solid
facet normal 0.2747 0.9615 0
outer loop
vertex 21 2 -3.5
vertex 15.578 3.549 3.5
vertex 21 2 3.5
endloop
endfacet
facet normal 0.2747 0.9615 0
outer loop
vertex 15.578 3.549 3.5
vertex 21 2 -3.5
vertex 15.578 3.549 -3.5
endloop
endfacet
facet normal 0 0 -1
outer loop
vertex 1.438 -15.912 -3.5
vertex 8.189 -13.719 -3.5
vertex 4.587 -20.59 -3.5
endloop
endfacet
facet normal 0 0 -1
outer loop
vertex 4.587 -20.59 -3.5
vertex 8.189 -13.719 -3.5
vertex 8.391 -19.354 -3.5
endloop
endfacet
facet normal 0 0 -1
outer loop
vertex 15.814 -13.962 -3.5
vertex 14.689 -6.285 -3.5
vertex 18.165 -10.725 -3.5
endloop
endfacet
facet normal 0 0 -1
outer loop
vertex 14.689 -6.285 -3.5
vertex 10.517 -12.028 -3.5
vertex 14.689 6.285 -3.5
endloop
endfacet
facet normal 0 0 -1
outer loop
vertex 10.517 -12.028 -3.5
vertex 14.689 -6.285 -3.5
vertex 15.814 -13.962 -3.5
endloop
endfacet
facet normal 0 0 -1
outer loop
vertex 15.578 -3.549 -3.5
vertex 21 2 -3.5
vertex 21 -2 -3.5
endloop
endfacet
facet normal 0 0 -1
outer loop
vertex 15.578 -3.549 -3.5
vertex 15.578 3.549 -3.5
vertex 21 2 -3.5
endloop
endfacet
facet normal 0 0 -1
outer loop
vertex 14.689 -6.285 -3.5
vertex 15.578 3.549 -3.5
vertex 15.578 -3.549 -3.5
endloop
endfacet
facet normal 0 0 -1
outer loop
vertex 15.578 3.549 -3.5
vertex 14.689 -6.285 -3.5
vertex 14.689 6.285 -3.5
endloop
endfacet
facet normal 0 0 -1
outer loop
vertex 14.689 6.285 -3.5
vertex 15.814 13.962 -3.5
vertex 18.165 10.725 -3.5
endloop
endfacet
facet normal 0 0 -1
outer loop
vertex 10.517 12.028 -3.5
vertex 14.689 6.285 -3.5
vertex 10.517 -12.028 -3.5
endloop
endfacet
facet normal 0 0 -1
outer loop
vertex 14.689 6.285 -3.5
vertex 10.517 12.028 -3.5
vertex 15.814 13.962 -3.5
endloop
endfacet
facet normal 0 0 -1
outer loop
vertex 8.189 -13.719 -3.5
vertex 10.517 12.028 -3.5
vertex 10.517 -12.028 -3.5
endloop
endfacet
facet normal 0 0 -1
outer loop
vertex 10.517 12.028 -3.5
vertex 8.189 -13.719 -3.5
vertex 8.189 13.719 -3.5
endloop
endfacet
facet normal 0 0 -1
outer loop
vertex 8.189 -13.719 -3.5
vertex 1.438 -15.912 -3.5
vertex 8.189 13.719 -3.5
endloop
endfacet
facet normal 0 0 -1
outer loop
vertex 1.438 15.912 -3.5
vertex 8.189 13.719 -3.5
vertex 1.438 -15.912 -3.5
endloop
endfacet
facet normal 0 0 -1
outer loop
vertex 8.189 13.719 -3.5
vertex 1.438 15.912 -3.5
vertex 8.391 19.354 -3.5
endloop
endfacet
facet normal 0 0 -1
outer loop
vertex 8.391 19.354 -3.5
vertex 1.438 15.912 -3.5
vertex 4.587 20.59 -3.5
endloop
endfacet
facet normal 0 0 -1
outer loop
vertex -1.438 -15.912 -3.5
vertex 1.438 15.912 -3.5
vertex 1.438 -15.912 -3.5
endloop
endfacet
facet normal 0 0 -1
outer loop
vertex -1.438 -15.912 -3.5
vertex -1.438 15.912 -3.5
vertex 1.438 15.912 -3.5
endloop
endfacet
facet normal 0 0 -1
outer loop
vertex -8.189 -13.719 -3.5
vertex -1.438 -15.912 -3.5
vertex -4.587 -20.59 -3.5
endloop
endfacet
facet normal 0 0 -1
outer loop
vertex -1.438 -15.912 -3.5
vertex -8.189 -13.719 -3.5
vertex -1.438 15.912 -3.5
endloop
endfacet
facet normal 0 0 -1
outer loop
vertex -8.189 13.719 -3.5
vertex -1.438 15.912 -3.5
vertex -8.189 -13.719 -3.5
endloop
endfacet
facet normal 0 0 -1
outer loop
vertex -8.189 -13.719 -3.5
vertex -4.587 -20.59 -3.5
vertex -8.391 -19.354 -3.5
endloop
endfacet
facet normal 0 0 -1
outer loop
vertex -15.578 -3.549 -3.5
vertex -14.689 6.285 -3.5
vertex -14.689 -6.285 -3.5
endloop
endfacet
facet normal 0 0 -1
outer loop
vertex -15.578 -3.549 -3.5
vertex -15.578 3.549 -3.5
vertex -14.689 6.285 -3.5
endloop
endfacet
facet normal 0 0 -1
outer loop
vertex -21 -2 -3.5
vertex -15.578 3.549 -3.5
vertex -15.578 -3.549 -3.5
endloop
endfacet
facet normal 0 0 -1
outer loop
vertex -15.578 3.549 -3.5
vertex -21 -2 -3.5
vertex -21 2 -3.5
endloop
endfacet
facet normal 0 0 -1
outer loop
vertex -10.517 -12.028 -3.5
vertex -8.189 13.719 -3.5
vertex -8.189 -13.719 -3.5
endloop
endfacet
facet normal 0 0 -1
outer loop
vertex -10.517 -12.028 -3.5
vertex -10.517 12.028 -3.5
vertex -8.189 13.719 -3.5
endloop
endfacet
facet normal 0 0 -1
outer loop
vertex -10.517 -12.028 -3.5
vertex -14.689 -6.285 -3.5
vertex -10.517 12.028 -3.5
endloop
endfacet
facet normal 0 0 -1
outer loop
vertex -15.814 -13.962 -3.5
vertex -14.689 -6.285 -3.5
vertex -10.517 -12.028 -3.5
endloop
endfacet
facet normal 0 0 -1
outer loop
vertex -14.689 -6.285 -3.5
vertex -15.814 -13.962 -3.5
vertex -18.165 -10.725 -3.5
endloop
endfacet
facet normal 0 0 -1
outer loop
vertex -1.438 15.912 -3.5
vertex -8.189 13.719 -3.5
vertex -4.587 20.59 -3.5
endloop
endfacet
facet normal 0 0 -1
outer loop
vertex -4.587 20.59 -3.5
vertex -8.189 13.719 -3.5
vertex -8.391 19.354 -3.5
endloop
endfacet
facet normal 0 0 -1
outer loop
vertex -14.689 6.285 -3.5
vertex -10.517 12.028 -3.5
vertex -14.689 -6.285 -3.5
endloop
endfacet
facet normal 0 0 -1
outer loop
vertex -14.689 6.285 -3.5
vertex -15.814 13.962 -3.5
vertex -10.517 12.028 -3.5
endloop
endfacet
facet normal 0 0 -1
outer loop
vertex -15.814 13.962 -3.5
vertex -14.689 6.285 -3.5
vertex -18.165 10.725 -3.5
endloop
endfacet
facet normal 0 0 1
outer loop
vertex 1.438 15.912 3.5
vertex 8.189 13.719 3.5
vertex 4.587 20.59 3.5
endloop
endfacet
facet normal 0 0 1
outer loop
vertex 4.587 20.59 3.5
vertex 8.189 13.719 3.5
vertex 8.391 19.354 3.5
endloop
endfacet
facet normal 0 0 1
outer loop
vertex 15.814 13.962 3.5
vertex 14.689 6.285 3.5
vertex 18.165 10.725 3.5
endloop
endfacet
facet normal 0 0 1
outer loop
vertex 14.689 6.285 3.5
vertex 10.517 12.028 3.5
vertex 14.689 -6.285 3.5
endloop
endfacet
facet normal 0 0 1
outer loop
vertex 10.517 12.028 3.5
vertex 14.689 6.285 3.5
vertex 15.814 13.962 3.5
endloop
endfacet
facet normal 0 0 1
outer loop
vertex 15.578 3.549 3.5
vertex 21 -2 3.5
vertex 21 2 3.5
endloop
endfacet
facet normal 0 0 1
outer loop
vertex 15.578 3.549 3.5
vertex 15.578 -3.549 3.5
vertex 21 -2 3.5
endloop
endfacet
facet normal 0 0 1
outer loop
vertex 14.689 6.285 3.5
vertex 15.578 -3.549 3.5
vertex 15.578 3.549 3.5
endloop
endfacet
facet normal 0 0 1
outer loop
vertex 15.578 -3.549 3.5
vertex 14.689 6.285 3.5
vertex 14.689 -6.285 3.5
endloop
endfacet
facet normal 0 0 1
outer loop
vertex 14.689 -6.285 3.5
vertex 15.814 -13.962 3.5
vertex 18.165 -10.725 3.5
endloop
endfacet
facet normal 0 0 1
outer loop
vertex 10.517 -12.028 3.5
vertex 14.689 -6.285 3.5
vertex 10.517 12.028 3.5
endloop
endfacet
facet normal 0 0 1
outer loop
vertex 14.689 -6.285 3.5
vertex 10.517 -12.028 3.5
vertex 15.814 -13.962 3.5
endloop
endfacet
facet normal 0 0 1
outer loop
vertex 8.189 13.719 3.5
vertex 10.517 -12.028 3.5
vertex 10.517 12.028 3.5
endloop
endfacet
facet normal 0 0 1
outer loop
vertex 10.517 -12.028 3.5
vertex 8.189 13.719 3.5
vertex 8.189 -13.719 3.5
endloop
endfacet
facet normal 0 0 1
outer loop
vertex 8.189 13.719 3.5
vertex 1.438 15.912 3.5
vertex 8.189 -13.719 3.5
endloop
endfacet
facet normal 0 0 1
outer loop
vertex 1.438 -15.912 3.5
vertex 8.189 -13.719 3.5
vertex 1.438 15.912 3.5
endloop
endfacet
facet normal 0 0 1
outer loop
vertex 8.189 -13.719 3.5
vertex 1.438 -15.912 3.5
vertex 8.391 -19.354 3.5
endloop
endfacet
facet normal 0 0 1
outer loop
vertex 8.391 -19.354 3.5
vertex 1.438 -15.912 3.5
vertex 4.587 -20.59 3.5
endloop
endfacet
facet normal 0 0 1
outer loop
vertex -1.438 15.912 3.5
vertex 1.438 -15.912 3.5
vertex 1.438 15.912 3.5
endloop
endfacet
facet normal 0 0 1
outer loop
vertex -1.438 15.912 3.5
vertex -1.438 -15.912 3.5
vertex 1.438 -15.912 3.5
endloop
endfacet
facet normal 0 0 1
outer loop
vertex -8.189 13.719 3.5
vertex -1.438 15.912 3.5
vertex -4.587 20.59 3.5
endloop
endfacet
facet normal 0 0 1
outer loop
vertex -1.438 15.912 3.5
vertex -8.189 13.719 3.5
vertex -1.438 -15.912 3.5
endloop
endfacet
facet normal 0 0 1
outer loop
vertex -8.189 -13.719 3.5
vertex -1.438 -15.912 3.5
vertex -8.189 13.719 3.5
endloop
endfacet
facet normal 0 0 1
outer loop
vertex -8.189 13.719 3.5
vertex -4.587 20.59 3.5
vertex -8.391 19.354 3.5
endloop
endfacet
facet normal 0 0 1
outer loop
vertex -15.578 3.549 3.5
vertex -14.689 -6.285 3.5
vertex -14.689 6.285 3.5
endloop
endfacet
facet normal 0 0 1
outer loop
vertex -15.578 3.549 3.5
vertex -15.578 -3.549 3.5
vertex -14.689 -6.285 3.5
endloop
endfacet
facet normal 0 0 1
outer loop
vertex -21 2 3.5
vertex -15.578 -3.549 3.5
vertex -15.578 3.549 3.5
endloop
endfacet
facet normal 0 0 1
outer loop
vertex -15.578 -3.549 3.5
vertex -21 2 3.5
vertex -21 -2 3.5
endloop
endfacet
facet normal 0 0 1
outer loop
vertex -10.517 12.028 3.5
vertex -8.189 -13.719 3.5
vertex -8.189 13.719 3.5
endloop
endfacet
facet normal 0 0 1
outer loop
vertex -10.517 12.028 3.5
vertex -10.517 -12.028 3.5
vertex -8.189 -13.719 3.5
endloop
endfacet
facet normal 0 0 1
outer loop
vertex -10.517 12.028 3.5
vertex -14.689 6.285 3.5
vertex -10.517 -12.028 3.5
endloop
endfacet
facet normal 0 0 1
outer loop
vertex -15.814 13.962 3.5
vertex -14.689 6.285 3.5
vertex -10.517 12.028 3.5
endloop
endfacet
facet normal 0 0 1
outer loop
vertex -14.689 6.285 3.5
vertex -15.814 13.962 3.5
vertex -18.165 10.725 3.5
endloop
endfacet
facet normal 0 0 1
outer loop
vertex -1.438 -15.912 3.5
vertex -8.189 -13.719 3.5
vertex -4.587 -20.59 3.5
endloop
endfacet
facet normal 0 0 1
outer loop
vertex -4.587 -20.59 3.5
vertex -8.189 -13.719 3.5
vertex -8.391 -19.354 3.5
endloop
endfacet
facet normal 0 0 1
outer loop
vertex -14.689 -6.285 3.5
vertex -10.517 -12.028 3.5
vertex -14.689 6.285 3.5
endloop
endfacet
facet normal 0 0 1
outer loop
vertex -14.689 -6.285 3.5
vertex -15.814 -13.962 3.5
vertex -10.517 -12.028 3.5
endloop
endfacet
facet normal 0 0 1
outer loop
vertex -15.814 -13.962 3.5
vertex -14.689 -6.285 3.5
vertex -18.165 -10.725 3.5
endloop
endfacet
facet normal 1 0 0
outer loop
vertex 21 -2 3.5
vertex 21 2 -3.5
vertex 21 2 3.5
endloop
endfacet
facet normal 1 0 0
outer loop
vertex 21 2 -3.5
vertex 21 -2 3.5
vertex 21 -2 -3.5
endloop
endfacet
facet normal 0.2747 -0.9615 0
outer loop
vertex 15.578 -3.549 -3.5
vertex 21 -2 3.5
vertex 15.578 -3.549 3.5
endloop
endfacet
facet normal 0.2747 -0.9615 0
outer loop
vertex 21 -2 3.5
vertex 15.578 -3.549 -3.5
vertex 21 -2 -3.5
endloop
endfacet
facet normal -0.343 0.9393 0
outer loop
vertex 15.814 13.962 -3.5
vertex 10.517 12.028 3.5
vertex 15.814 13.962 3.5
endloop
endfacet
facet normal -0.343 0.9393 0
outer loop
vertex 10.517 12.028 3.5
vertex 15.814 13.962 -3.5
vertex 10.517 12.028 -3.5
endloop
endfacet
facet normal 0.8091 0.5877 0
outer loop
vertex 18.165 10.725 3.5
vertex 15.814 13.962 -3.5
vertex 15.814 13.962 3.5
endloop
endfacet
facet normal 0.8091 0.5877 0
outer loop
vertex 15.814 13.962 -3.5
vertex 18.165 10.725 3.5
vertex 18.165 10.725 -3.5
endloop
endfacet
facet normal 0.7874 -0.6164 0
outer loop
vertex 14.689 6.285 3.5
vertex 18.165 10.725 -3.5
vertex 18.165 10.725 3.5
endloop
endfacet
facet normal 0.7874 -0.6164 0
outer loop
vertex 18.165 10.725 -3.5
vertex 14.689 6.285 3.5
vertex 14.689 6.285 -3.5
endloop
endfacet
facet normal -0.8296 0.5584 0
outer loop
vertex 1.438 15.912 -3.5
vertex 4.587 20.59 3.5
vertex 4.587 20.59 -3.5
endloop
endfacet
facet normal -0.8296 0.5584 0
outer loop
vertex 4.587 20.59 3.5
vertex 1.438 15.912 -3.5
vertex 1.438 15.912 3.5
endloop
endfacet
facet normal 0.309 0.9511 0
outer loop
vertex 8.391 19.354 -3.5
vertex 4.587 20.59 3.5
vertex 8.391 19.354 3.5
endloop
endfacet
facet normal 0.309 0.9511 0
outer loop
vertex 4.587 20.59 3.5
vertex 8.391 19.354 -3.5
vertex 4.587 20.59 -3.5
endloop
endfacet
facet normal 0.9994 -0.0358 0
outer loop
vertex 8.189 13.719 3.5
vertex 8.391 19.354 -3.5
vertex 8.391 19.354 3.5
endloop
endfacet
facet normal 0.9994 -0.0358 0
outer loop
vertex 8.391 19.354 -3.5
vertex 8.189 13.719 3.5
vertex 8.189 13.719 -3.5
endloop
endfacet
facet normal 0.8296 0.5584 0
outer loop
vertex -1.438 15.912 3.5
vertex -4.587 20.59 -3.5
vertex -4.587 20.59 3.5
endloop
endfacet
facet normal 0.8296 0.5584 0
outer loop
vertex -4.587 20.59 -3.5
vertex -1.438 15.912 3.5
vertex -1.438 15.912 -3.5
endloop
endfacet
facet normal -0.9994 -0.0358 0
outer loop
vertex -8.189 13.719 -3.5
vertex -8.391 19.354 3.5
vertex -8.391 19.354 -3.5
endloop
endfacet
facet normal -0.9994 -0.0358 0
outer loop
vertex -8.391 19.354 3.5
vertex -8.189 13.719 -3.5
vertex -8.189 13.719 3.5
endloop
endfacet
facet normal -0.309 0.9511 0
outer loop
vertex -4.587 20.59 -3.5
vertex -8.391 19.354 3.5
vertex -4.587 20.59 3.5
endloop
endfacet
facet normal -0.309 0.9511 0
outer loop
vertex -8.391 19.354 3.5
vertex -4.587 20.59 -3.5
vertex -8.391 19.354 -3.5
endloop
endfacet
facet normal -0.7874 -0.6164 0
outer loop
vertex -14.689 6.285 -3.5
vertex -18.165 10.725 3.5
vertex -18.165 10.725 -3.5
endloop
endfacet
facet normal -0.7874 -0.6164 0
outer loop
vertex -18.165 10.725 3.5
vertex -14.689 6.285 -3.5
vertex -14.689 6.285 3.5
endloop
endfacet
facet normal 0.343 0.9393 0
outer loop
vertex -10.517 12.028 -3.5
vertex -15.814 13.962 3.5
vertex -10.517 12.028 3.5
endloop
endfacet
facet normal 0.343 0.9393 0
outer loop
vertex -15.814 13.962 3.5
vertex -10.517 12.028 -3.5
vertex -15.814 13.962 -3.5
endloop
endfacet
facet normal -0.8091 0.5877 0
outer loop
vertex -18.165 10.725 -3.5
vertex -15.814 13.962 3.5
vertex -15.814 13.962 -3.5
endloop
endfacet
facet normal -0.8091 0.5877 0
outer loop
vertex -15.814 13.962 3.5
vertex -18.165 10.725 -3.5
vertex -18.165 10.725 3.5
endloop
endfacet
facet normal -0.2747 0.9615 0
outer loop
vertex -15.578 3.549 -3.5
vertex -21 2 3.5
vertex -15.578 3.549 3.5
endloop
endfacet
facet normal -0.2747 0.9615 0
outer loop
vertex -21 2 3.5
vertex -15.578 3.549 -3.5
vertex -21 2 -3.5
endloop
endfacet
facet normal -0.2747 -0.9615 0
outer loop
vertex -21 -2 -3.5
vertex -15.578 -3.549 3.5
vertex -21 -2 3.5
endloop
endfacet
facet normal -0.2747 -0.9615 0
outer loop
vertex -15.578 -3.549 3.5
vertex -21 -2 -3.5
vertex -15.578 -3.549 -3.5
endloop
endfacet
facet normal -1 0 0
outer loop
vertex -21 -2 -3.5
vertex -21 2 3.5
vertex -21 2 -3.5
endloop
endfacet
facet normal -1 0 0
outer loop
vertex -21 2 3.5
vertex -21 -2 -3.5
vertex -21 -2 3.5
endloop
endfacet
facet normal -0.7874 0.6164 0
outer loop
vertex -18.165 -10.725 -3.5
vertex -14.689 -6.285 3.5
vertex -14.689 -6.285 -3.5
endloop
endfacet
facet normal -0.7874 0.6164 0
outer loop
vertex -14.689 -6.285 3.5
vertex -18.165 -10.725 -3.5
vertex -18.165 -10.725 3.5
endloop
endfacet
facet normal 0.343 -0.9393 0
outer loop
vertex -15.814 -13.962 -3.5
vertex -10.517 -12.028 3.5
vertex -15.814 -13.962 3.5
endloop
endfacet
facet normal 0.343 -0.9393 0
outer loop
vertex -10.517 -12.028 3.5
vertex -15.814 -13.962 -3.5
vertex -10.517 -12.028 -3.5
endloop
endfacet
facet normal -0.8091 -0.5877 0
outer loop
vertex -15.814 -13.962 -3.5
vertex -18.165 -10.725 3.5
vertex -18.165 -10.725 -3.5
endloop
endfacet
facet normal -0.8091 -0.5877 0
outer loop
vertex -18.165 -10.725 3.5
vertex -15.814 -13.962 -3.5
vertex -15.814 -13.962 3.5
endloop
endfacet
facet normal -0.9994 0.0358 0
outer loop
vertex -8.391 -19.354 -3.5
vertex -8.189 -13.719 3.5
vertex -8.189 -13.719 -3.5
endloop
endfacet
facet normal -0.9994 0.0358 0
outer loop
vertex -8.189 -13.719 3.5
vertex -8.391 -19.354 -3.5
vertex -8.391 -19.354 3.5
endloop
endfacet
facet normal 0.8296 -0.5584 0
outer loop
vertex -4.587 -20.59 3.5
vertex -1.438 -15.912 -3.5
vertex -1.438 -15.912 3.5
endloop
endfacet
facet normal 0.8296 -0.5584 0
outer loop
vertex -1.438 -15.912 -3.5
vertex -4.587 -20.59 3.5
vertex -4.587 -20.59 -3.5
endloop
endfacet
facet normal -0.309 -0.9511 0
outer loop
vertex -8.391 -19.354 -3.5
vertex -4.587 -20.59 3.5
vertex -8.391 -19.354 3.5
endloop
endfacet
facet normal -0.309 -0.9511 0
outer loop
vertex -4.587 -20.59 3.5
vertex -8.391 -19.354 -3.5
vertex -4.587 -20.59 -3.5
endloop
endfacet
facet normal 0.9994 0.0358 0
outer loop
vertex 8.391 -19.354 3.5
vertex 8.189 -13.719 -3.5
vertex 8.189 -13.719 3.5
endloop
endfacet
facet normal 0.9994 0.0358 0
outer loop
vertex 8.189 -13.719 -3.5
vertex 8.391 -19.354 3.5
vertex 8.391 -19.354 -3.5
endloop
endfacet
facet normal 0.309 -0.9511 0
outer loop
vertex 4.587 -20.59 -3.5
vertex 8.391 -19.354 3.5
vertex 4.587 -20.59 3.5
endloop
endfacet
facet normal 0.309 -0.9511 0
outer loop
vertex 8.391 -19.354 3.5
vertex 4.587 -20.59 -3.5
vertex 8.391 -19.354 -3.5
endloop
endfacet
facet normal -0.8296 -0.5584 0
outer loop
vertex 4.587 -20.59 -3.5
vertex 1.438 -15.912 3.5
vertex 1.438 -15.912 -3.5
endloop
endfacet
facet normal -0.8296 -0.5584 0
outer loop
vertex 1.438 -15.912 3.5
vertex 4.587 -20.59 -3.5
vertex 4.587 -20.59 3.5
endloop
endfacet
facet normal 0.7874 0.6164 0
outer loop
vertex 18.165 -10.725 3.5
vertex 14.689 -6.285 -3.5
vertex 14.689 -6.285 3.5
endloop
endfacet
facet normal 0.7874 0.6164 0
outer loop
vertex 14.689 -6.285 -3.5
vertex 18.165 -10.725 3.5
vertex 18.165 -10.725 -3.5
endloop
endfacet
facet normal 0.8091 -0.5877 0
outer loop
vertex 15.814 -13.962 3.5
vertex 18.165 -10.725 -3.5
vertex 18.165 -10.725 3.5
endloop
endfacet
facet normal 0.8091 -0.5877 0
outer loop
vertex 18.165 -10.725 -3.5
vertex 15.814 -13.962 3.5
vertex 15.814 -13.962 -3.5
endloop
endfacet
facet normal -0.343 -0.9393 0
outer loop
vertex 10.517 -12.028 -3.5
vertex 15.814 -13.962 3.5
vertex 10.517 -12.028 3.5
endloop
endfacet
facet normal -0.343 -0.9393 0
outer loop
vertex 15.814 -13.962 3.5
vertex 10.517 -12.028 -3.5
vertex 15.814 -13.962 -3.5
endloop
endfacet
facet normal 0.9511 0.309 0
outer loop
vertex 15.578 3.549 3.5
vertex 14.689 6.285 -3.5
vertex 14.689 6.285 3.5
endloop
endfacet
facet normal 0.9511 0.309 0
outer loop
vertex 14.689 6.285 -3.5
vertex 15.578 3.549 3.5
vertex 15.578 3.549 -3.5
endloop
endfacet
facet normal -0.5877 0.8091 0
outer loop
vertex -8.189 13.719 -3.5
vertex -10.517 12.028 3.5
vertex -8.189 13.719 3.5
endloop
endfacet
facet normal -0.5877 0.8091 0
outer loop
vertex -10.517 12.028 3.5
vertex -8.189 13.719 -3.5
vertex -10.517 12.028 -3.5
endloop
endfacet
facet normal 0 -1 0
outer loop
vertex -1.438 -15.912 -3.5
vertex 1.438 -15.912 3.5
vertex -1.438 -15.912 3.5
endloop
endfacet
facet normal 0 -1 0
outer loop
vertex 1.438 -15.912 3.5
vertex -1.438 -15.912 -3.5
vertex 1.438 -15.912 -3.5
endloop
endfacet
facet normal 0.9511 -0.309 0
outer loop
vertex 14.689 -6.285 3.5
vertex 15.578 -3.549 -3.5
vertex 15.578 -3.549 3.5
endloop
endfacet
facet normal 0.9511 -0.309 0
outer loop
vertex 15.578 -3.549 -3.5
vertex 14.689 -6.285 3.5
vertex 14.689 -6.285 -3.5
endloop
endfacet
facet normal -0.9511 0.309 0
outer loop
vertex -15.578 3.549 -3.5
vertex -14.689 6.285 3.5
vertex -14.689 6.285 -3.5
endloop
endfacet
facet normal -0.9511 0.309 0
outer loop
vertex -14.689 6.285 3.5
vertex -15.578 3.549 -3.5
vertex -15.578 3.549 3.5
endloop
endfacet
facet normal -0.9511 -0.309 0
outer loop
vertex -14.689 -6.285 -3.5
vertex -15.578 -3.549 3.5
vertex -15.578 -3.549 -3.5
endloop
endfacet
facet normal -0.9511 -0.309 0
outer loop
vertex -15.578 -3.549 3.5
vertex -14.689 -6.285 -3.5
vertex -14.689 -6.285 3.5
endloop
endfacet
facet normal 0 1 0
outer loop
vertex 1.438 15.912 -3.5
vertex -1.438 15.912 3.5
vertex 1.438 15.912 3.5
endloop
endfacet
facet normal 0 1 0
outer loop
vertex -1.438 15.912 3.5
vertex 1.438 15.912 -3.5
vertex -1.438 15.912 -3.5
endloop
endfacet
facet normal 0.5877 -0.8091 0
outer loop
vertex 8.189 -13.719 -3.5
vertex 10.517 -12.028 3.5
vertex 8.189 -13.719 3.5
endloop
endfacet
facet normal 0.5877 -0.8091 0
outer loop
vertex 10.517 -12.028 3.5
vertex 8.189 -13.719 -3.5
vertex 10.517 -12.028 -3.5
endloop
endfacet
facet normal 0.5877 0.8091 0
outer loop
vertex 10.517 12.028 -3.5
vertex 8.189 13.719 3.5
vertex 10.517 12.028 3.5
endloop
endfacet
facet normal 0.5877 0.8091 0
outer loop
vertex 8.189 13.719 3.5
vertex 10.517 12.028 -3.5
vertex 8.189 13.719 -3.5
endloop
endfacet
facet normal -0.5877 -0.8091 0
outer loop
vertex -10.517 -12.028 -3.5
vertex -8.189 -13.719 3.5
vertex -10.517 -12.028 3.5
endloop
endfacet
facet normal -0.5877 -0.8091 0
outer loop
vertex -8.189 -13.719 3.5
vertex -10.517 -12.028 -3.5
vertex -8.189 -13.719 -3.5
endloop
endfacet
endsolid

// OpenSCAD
module Gear_01(){

    color("#a8b0b2")
    union(){
        cylinder(7,16,16,$fn=30,center= true);

        for (i=[0:45:359]) {
            r = 14; // pattern radius
            n = 10; // number of teeth
            step = 360/n;
            
            for (i=[0:step:359]) {
                angle = i;
                dx = r*cos(angle);
                dy = r*sin(angle);
                translate([dx,dy,0])
                rotate([0,0,angle])  
                { 
                // #linear_extrude(7, scale = 1, center = true)
                linear_extrude(7, scale = 1, center = true)
                polygon(points=[[0,-4],[7,-2],[7,2],[0,4]]);
                 
                }    
            }
        }
    }

}


Gear_01();

// Written by Nicolì Angelo (Gengio) 2024: 
// MIT License

//Permission is hereby granted, free of charge, to any person obtaining a copy of this software and associated documentation files (the "Software"), to deal in the Software without restriction, including without limitation the rights to use, copy, modify, merge, publish, distribute, sublicense, and/or sell copies of the Software, and to permit persons to whom the Software is furnished to do so, subject to the following conditions:

//The above copyright notice and this permission notice shall be included in all copies or substantial portions of the Software.

//THE SOFTWARE IS PROVIDED "AS IS", WITHOUT WARRANTY OF ANY KIND, EXPRESS OR IMPLIED, INCLUDING BUT NOT LIMITED TO THE WARRANTIES OF MERCHANTABILITY, FITNESS FOR A PARTICULAR PURPOSE AND NONINFRINGEMENT. IN NO EVENT SHALL THE AUTHORS OR COPYRIGHT HOLDERS BE LIABLE FOR ANY CLAIM, DAMAGES OR OTHER LIABILITY, WHETHER IN AN ACTION OF CONTRACT, TORT OR OTHERWISE, ARISING FROM, OUT OF OR IN CONNECTION WITH THE SOFTWARE OR THE USE OR OTHER DEALINGS IN THE SOFTWARE.
